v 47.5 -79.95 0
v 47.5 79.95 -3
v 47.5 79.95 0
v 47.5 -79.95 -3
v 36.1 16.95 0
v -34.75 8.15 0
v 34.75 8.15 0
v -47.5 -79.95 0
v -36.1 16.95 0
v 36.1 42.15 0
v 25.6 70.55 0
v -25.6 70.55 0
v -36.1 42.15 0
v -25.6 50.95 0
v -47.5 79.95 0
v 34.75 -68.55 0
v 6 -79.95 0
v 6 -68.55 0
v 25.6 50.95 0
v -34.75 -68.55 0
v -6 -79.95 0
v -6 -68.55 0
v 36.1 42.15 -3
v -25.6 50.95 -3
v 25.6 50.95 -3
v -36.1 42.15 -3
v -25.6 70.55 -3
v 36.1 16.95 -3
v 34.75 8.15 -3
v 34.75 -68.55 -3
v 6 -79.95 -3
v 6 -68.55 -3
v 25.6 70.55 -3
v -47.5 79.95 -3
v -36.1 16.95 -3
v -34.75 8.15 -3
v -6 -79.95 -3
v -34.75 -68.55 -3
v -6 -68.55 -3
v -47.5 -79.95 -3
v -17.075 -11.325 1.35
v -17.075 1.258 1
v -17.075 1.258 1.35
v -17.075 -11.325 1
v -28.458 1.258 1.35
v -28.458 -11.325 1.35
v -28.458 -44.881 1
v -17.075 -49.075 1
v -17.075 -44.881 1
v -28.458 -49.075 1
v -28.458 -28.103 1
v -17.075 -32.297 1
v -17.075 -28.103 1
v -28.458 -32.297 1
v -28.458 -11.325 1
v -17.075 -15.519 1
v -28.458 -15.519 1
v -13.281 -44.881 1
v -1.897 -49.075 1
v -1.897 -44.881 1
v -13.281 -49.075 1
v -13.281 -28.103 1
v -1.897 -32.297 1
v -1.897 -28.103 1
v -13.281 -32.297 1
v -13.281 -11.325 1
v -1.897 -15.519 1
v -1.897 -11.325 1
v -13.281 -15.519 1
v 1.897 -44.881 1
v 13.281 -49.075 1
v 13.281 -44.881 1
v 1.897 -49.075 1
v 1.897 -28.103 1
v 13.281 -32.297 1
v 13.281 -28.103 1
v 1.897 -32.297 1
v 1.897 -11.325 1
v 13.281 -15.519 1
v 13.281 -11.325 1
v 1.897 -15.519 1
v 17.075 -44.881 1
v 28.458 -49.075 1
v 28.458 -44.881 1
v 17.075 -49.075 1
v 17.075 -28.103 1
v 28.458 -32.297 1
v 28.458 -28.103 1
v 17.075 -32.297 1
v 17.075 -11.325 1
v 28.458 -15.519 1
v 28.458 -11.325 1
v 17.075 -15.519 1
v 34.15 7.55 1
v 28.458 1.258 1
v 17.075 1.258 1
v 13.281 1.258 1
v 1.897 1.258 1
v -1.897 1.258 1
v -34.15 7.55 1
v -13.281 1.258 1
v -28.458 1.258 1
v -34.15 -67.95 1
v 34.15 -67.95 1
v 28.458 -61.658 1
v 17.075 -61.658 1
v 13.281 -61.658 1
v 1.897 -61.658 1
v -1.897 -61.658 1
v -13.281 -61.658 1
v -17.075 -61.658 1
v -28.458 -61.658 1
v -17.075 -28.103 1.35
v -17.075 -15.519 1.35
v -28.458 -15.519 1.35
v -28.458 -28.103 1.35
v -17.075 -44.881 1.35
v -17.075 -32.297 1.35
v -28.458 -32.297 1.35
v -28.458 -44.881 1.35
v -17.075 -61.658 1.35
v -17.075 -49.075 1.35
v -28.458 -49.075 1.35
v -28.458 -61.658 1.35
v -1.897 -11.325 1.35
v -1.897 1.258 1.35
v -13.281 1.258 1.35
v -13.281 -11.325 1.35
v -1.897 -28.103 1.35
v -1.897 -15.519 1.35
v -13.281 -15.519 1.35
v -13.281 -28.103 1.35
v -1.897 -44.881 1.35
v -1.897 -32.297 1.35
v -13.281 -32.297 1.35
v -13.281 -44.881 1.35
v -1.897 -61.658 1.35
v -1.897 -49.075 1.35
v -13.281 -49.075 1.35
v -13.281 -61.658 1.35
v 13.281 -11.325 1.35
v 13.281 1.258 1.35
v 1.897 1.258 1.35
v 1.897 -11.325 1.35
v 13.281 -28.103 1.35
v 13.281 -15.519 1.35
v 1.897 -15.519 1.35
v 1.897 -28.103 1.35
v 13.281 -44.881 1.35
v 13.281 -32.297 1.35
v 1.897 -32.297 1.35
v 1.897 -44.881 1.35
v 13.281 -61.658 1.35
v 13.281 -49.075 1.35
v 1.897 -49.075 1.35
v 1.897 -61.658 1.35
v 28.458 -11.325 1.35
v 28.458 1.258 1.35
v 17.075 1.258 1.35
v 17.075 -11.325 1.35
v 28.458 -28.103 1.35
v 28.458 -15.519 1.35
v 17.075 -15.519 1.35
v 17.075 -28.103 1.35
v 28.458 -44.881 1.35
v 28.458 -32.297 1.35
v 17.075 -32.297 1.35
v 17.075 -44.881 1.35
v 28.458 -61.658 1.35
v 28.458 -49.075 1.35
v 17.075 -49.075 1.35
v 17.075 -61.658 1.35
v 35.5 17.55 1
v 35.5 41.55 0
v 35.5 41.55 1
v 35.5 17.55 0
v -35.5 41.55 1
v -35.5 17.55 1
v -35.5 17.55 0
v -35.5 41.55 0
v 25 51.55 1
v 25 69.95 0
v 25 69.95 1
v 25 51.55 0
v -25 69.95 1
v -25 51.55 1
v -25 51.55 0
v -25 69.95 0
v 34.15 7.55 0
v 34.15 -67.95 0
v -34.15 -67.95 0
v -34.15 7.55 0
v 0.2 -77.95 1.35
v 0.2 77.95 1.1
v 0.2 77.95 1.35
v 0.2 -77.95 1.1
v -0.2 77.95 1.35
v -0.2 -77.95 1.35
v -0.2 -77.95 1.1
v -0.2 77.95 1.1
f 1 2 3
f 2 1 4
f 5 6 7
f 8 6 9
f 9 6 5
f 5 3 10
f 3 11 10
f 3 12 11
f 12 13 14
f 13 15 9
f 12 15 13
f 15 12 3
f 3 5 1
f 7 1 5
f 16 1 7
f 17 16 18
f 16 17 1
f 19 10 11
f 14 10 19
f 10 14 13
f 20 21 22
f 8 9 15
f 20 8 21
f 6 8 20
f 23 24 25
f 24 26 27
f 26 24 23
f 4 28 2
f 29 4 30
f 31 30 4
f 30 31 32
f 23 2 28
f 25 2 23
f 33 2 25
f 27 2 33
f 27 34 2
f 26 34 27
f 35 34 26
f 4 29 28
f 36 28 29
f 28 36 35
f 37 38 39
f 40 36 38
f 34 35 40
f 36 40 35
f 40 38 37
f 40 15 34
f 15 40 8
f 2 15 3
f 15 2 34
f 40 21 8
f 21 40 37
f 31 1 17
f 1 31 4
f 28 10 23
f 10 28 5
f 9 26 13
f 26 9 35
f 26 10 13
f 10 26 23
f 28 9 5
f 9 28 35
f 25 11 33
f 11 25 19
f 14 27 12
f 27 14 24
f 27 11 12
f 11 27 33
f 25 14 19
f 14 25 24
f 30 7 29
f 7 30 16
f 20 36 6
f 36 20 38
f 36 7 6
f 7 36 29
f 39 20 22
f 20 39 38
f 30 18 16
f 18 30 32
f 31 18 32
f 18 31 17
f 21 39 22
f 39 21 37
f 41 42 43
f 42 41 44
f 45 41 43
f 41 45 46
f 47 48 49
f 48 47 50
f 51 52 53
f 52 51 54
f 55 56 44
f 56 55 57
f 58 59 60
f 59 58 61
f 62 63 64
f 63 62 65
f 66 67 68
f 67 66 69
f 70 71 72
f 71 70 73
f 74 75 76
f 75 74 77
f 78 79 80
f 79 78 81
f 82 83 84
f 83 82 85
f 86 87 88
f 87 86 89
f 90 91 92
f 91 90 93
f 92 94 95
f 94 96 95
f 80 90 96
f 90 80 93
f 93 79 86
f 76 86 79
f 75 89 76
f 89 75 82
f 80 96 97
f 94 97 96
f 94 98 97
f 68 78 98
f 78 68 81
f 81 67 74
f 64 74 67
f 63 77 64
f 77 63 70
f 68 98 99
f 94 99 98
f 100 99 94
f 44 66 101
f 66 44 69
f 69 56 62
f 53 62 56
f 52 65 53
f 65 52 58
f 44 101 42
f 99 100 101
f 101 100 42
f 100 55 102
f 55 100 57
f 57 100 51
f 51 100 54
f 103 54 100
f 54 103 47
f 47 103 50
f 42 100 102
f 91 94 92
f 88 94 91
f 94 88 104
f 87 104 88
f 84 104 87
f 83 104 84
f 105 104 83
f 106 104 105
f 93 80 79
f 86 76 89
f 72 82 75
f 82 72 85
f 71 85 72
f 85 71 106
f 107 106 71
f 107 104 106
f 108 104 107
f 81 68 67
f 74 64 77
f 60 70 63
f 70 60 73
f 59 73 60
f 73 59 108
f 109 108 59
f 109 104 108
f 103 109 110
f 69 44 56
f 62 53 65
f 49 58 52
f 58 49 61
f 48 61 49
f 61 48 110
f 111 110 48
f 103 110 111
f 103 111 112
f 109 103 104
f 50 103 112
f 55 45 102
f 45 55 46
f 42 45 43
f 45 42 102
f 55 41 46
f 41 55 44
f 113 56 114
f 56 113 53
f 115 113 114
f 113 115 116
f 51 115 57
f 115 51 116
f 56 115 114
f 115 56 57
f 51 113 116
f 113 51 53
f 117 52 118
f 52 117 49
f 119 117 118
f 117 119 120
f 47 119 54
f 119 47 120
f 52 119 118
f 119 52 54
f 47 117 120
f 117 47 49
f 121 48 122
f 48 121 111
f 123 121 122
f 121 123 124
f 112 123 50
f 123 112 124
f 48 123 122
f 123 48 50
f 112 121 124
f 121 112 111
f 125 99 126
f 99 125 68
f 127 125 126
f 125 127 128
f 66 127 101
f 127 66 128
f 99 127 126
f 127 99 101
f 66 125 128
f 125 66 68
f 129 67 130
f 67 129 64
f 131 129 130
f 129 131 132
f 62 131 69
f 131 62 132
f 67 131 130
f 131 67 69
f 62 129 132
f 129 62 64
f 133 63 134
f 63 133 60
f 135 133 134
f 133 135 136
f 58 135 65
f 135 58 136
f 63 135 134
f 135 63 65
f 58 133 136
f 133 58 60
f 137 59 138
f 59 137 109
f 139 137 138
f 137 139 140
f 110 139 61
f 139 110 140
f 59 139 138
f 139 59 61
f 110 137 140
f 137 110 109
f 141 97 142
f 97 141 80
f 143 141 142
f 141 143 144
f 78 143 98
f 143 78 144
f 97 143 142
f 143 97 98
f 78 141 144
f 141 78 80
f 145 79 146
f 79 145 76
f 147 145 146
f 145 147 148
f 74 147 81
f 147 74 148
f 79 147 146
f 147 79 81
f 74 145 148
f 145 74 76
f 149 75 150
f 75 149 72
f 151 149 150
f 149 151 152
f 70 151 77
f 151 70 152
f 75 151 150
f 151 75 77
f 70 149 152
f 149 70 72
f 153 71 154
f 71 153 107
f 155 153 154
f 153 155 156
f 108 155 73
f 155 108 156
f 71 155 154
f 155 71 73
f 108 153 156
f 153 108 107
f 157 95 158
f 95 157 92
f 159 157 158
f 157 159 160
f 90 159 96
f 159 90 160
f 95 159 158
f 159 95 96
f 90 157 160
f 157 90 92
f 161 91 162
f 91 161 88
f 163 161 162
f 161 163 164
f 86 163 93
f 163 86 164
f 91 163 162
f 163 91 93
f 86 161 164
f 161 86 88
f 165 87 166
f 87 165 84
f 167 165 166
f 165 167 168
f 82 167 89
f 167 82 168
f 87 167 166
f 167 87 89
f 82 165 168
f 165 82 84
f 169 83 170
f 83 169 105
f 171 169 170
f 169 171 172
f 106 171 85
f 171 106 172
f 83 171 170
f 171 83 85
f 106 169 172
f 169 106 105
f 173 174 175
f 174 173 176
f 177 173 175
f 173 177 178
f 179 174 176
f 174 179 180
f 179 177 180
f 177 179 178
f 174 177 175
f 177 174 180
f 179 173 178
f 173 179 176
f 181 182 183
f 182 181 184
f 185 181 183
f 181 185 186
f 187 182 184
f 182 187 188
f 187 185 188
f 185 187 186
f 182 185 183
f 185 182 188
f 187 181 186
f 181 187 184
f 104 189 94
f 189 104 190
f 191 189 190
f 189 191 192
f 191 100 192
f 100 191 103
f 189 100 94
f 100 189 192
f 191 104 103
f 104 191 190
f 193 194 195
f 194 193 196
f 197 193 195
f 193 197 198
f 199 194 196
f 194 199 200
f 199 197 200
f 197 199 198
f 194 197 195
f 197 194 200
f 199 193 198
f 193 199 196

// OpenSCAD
// Phototherapy Timer — front surface plate (UI faces)
//
// Operator-facing stack, vertical centerline (matches stock top frame):
//   top → TM1637 LED → LCD1602 → 4×4 keypad → bottom
//
// Display faces are COPLANAR with the keypad face (flush front plane).
// Backpacks / PCB bulk hang behind the plate (not modeled in detail yet).
//
// Dimensions from docs/front-panel.md (caliper / ruler, 2026-07).
// Z-depth of pockets: wait for better calipers.
//
// Preview:  openscad docs/mechanical/front-panel.scad
// PNG:      openscad -o /tmp/front-panel.png --imgsize=1200,900 \
//             --camera=0,0,0,55,0,25,400 docs/mechanical/front-panel.scad
// STL:      openscad -o docs/mechanical/front-panel.stl docs/mechanical/front-panel.scad

/* [Faces — measured] */
// TM1637 LED housing face (mm) — not full PCB; ONE module at top
tm_w = 50;
tm_h = 18.4;

// LCD bezel face (mm)
lcd_w = 71;
lcd_h = 24;

// Keypad membrane outer (mm) — 2 11/16" x (3" - 1/32")
key_w = 68.3;
key_h = 75.5;

/* [Layout] */
// Gap between TM1637 bottom and LCD top (mm)
gap_tm_lcd = 10;

// Gap between LCD bottom and keypad top (mm)
gap_lcd_key = 10;

// Margin around content to plate outer edge (mm)
margin_x = 12;
margin_top = 10;
margin_bottom = 12; // extra room for ribbon exit below keypad

/* [Plate] */
plate_thickness = 3;
// How far face inserts sit proud of plate front (0 = flush with front)
face_proud = 0;

// Cutout clearance beyond face outline (mm each side total = 2*)
cutout_clear = 0.6;

/* [Visibility] */
show_plate = true;
show_faces = true;
show_cutouts_only = false; // if true: plate with holes, no solid faces
show_centerline = true;
show_labels = true;
// Simple behind-plate blocks (illustrative; depths are placeholders)
show_back_bulk = false;
lcd_back_depth = 18; // placeholder until calipered
tm_back_depth = 12;  // placeholder
key_adapter_depth = 8; // placeholder I2C board pocket

/* [Hidden] */
eps = 0.02;
$fn = 32;

// ---- derived layout (Y up, X right, Z toward operator) ----
// Origin: plate center in X, front face at Z=0, Y=0 at vertical center of content stack.

content_h = tm_h + gap_tm_lcd + lcd_h + gap_lcd_key + key_h;
content_w = max(lcd_w, tm_w, key_w);

plate_w = content_w + 2 * margin_x;
plate_h = content_h + margin_top + margin_bottom;

// Y of each face center (content centered on plate)
// top → TM1637 → LCD → keypad → bottom
y_top = plate_h / 2 - margin_top;
y_tm  = y_top - tm_h / 2;
y_lcd = y_tm  - tm_h / 2 - gap_tm_lcd - lcd_h / 2;
y_key = y_lcd - lcd_h / 2 - gap_lcd_key - key_h / 2;

// Plate occupies Z = [-plate_thickness, 0]; front skin at Z = 0.
// Face inserts sit on the front plane so LCD / TM / keypad are coplanar.

module face_rect(w, h, t = 1.0, color_name = "SteelBlue") {
    // Front of face at Z = face_proud + t (all faces share face_proud)
    color(color_name)
        translate([-w / 2, -h / 2, face_proud])
            cube([w, h, t]);
}

module cutout_rect(w, h) {
    cw = w + 2 * cutout_clear;
    ch = h + 2 * cutout_clear;
    translate([-cw / 2, -ch / 2, -plate_thickness - eps])
        cube([cw, ch, plate_thickness + 2 * eps]);
}

module plate_body() {
    color("Gainsboro")
        translate([-plate_w / 2, -plate_h / 2, -plate_thickness])
            cube([plate_w, plate_h, plate_thickness]);
}

module plate_with_cutouts() {
    difference() {
        plate_body();
        translate([0, y_lcd, 0]) cutout_rect(lcd_w, lcd_h);
        translate([0, y_tm, 0])  cutout_rect(tm_w, tm_h);
        translate([0, y_key, 0]) cutout_rect(key_w, key_h);
        // ribbon slot under keypad (optional service path)
        translate([-6, y_key - key_h / 2 - 12, -plate_thickness - eps])
            cube([12, 12, plate_thickness + 2 * eps]);
    }
}

module faces_flush() {
    // All three fronts even (same face_proud / thickness family)
    face_t = 1.0;
    translate([0, y_lcd, 0])
        face_rect(lcd_w, lcd_h, face_t, "RoyalBlue");
    translate([0, y_tm, 0])
        face_rect(tm_w, tm_h, face_t, "DarkRed");
    translate([0, y_key, 0])
        face_rect(key_w, key_h, face_t, "DimGray");

    // Key legend hint (optional visual only)
    if (show_labels) {
        color("SkyBlue")
            for (col = [-1.5, -0.5, 0.5, 1.5])
                for (row = [1.5, 0.5, -0.5, -1.5])
                    translate([
                        col * (key_w / 4.5) - key_w / 12,
                        y_key + row * (key_h / 4.5) - key_h / 12,
                        face_proud + face_t
                    ])
                        cube([key_w / 6, key_h / 6, 0.35]);
    }
}

module back_bulk_placeholder() {
    // Behind plate (negative Z): depths are placeholders until calipered
    color("Green", 0.45)
        translate([-(lcd_w + 6) / 2, y_lcd - (lcd_h + 4) / 2, -plate_thickness - lcd_back_depth])
            cube([lcd_w + 6, lcd_h + 4, lcd_back_depth]);
    color("Maroon", 0.45)
        translate([-(tm_w + 4) / 2, y_tm - (tm_h + 6) / 2, -plate_thickness - tm_back_depth])
            cube([tm_w + 4, tm_h + 6, tm_back_depth]);
    color("Gray", 0.35)
        translate([-15, y_key - key_h / 2 - 18, -plate_thickness - key_adapter_depth])
            cube([30, 20, key_adapter_depth]);
}

module centerline_mark() {
    color("OrangeRed")
        translate([-0.2, -plate_h / 2 + 2, face_proud + 1.1])
            cube([0.4, plate_h - 4, 0.25]);
}

// ---- assembly ----
if (show_plate) {
    if (show_cutouts_only || show_faces)
        plate_with_cutouts();
    else
        plate_body();
}

if (show_faces && !show_cutouts_only)
    faces_flush();

if (show_back_bulk)
    back_bulk_placeholder();

if (show_centerline)
    centerline_mark();

// Echo layout summary in console when rendered/previewed
echo("=== front-panel layout (mm) ===");
echo("order: top → TM1637 → LCD → keypad → bottom");
echo("plate_w x plate_h x t =", plate_w, plate_h, plate_thickness);
echo("content_w x content_h =", content_w, content_h);
echo("tm  center Y =", y_tm,  " size", tm_w, "x", tm_h);
echo("lcd center Y =", y_lcd, " size", lcd_w, "x", lcd_h);
echo("key center Y =", y_key, " size", key_w, "x", key_h);
echo("faces coplanar at Z~0 (even with keypad)");
